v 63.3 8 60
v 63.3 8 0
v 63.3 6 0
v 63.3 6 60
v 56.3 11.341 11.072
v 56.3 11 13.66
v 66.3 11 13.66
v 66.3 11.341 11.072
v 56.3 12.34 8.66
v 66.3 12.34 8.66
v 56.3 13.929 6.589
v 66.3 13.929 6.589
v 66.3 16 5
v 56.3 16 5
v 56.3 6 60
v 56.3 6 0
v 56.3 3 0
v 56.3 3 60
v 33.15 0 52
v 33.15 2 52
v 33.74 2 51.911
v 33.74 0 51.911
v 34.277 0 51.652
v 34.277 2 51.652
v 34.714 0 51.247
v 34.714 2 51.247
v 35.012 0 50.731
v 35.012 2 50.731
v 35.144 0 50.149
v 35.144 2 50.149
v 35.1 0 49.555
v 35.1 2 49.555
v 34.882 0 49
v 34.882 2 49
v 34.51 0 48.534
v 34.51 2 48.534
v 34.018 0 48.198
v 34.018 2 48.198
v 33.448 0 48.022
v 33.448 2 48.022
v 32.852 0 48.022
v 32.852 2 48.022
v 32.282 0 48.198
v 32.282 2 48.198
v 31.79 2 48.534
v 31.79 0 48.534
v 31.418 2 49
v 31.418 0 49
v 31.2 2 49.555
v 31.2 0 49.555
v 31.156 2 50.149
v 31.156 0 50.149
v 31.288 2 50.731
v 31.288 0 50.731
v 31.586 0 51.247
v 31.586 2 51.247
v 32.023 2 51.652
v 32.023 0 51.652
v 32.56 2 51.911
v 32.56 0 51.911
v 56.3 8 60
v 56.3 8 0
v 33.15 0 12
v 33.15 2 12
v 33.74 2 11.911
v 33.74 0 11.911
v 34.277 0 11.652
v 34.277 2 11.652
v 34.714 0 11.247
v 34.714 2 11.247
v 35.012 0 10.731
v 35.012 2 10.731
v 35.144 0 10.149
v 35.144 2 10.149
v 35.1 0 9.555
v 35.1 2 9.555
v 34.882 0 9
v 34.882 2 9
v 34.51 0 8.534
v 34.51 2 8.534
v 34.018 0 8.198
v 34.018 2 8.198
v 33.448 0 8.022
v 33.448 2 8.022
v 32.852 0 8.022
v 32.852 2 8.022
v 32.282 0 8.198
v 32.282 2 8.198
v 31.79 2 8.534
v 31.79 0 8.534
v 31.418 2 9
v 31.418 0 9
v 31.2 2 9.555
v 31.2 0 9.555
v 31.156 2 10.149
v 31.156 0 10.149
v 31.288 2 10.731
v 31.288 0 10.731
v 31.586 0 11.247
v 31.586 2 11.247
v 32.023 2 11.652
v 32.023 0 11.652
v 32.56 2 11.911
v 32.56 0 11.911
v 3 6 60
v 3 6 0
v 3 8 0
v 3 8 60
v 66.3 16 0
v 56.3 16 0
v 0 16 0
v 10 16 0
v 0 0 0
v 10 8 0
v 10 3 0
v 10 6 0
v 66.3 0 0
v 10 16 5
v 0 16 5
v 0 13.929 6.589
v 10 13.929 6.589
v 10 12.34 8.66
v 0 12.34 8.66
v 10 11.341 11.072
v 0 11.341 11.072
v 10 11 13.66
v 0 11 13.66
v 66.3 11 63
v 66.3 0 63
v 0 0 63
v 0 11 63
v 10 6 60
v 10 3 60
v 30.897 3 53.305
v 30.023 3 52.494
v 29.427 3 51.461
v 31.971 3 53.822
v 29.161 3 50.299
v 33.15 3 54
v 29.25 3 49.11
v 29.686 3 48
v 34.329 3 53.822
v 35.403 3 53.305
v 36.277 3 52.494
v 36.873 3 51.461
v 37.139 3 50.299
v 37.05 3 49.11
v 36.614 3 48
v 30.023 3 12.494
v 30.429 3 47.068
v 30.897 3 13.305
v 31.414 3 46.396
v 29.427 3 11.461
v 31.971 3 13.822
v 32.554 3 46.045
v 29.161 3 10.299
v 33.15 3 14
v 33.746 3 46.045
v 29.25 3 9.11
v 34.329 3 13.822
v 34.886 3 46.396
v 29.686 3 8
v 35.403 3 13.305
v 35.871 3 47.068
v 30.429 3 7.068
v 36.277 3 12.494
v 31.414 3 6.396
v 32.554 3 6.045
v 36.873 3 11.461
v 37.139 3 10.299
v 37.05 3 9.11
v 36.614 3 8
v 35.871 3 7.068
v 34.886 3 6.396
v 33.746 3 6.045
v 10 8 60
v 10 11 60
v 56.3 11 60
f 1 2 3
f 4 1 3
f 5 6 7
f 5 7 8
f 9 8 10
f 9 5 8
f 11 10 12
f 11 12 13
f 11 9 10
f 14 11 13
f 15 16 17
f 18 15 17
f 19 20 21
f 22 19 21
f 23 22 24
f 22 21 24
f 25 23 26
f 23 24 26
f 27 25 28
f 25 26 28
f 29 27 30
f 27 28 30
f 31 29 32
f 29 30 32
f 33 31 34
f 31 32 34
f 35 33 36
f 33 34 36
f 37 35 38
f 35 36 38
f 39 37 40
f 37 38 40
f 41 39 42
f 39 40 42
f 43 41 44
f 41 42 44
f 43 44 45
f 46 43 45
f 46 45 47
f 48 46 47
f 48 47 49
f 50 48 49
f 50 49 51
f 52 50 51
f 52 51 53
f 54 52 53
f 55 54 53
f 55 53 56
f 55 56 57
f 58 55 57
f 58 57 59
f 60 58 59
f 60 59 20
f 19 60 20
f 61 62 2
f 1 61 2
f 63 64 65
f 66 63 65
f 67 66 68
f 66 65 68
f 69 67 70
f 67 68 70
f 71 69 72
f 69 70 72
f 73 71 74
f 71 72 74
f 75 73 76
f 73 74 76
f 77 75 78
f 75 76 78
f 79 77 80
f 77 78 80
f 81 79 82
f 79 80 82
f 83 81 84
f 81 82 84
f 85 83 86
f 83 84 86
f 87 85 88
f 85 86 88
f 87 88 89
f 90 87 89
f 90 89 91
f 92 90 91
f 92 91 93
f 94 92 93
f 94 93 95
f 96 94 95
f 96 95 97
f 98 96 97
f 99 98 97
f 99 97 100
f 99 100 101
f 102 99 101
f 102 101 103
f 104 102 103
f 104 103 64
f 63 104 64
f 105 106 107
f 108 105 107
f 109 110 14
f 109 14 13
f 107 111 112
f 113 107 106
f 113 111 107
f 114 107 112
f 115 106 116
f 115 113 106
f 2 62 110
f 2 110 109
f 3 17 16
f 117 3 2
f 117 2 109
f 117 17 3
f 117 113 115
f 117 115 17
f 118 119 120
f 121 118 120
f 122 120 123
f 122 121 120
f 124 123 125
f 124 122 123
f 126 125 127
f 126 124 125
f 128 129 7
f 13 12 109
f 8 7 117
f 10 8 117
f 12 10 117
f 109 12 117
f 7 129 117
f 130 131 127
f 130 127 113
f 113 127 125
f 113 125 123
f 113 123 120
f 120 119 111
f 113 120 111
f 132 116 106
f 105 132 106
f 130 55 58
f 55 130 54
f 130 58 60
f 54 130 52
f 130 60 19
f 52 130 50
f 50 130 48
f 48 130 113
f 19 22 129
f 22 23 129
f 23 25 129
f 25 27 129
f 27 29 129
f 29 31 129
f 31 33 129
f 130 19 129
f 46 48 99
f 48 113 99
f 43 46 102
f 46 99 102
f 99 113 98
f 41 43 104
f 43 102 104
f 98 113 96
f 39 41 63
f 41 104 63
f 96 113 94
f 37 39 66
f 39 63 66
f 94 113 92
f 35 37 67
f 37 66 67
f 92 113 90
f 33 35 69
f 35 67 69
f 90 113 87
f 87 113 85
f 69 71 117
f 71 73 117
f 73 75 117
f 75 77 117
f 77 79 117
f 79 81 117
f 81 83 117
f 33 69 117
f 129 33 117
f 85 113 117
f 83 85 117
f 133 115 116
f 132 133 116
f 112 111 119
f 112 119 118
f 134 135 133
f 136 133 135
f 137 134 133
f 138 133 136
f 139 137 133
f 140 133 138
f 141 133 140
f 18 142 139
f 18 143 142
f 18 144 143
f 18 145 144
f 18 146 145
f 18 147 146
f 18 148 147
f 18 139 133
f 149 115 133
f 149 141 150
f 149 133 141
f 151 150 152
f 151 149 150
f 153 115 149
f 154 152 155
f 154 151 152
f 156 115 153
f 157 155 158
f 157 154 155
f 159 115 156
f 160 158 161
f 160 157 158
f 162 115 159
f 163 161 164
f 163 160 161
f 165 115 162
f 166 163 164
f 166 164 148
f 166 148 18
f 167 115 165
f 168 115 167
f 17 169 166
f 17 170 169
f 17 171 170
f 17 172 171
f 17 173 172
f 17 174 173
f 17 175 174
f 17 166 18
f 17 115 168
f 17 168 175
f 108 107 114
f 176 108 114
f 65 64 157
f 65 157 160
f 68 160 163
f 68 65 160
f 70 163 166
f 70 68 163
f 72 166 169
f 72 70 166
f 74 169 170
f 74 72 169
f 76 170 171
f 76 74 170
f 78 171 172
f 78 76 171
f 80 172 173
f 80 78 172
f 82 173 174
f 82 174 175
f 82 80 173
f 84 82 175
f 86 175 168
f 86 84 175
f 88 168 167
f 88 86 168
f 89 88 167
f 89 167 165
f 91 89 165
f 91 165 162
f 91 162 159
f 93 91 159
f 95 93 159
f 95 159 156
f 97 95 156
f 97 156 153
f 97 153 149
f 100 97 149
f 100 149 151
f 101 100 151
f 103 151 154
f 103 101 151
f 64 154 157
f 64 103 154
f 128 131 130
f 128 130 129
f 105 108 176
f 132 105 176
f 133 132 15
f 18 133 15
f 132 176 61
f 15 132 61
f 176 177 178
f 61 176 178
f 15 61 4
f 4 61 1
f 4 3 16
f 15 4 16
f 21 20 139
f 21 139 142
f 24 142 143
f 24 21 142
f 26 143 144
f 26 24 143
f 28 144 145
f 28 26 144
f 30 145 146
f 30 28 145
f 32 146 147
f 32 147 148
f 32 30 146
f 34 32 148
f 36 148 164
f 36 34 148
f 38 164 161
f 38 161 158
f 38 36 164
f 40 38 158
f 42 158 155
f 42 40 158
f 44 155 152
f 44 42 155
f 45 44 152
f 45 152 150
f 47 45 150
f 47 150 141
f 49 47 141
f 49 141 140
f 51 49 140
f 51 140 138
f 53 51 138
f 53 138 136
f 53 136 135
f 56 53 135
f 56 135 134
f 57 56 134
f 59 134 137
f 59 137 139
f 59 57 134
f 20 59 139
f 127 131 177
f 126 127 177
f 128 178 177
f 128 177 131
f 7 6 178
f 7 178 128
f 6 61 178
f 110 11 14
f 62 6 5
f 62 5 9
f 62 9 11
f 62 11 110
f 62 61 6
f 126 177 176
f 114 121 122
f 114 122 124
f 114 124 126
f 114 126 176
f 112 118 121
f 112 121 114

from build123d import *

# Parameters (mm, degrees)
SKETCH_1_W      = 66.3
SKETCH_1_H      = 3
BASE_DEPTH      = 60
RAILS_DEPTH     = 60
SKETCH_3_R      = 2
HOLES_DEPTH     = 90.775776243
CHAMFER_1_SIZE  = 2
CHAMFER_1_SIZE2 = 1
SKETCH_4_W      = 66.3
SKETCH_4_H      = 11
FLOOR_2_DEPTH   = 3
SKETCH_5_W      = 10
SKETCH_5_H      = 5
EXTRUDE_1_DEPTH = 5
FILLET_1_R      = 10


with BuildPart() as part:
    # Эскиз1 → base (new body)
    with BuildSketch(Plane.XY):
        with Locations((33.15, 1.5)):
            Rectangle(SKETCH_1_W, SKETCH_1_H)
    extrude(amount=BASE_DEPTH)

    # Эскиз2 → rails (add)
    with BuildSketch(Plane.XY):
        Polygon((0, 3), (10, 3), (10, 6), (3, 6), (3, 8), (10, 8), (10, 11), (0, 11), align=None)
        Polygon((56.3, 11), (56.3, 8), (63.3, 8), (63.3, 6), (56.3, 6), (56.3, 3), (66.3, 3), (66.3, 11), align=None)
    extrude(amount=RAILS_DEPTH)

    # Эскиз3 → holes (cut, through all)
    with BuildSketch(Plane(origin=(0, 3, 0), x_dir=(1, 0, 0), z_dir=(0, 1, 0))):
        with Locations(Location((33.15, -10, 0), (0, 0, 270))):
            Circle(SKETCH_3_R)
        with Locations(Location((33.15, -50, 0), (0, 0, 270))):
            Circle(SKETCH_3_R)
    extrude(amount=-HOLES_DEPTH, mode=Mode.SUBTRACT)

    # Фаска1
    chamfer_1_edges = [part.edges().sort_by_distance(p)[0] for p in [
        (33.15, 3, 8),
        (33.15, 3, 48),
    ]]
    chamfer_1_side = [part.faces().sort_by_distance(p)[0] for p in [
        (33.15, 3, 30),
    ]]
    chamfer(chamfer_1_edges, length=CHAMFER_1_SIZE, length2=CHAMFER_1_SIZE2, reference=chamfer_1_side[0])

    # Эскиз4 → floor 2 (add)
    with BuildSketch(Plane.XY.offset(60)):
        with Locations((33.15, 5.5)):
            Rectangle(SKETCH_4_W, SKETCH_4_H)
    extrude(amount=FLOOR_2_DEPTH)

    # Эскиз5 → Вытянуть1 (add)
    with BuildSketch(Plane(origin=(0, 11, 0), x_dir=(1, 0, 0), z_dir=(0, 1, 0))):
        with Locations((5, -2.5)):
            Rectangle(SKETCH_5_W, SKETCH_5_H)
        with Locations((61.3, -2.5)):
            Rectangle(SKETCH_5_W, SKETCH_5_H)
    extrude(amount=EXTRUDE_1_DEPTH)

    # Скругление1
    # the kernel refuses this fillet: 10 mm, written as the material it adds along each edge
    with BuildSketch(Plane(origin=(56.3, 11, 5), x_dir=(0, 0, 1), z_dir=(1, 0, 0))) as fillet_1_piece_1:
        with BuildLine():
            CenterArc((8.660254038, -10), FILLET_1_R, 90, 60)
            Line((0, -5), (-0.173205081, -4.9))
            ThreePointArc((-0.173205081, -4.9), (-0.2, -2.5), (-0.2, 0))
            Line((-0.2, 0), (0, 0.2))
            Line((0, 0.2), (8.660254038, 0.2))
            Line((8.660254038, 0.2), (8.660254038, 0))
        make_face()
    extrude(amount=10)
    with BuildSketch(Plane(origin=(10, 11, 5), x_dir=(0, 0, 1), z_dir=(-1, 0, 0))) as fillet_1_piece_2:
        with BuildLine():
            CenterArc((8.660254038, 10), FILLET_1_R, 210, 60)
            Line((0, 5), (-0.173205081, 4.9))
            ThreePointArc((-0.173205081, 4.9), (-0.2, 2.5), (-0.2, 0))
            Line((-0.2, 0), (0, -0.2))
            Line((0, -0.2), (8.660254038, -0.2))
            Line((8.660254038, -0.2), (8.660254038, 0))
        make_face()
    extrude(amount=10)


solid = part.part
